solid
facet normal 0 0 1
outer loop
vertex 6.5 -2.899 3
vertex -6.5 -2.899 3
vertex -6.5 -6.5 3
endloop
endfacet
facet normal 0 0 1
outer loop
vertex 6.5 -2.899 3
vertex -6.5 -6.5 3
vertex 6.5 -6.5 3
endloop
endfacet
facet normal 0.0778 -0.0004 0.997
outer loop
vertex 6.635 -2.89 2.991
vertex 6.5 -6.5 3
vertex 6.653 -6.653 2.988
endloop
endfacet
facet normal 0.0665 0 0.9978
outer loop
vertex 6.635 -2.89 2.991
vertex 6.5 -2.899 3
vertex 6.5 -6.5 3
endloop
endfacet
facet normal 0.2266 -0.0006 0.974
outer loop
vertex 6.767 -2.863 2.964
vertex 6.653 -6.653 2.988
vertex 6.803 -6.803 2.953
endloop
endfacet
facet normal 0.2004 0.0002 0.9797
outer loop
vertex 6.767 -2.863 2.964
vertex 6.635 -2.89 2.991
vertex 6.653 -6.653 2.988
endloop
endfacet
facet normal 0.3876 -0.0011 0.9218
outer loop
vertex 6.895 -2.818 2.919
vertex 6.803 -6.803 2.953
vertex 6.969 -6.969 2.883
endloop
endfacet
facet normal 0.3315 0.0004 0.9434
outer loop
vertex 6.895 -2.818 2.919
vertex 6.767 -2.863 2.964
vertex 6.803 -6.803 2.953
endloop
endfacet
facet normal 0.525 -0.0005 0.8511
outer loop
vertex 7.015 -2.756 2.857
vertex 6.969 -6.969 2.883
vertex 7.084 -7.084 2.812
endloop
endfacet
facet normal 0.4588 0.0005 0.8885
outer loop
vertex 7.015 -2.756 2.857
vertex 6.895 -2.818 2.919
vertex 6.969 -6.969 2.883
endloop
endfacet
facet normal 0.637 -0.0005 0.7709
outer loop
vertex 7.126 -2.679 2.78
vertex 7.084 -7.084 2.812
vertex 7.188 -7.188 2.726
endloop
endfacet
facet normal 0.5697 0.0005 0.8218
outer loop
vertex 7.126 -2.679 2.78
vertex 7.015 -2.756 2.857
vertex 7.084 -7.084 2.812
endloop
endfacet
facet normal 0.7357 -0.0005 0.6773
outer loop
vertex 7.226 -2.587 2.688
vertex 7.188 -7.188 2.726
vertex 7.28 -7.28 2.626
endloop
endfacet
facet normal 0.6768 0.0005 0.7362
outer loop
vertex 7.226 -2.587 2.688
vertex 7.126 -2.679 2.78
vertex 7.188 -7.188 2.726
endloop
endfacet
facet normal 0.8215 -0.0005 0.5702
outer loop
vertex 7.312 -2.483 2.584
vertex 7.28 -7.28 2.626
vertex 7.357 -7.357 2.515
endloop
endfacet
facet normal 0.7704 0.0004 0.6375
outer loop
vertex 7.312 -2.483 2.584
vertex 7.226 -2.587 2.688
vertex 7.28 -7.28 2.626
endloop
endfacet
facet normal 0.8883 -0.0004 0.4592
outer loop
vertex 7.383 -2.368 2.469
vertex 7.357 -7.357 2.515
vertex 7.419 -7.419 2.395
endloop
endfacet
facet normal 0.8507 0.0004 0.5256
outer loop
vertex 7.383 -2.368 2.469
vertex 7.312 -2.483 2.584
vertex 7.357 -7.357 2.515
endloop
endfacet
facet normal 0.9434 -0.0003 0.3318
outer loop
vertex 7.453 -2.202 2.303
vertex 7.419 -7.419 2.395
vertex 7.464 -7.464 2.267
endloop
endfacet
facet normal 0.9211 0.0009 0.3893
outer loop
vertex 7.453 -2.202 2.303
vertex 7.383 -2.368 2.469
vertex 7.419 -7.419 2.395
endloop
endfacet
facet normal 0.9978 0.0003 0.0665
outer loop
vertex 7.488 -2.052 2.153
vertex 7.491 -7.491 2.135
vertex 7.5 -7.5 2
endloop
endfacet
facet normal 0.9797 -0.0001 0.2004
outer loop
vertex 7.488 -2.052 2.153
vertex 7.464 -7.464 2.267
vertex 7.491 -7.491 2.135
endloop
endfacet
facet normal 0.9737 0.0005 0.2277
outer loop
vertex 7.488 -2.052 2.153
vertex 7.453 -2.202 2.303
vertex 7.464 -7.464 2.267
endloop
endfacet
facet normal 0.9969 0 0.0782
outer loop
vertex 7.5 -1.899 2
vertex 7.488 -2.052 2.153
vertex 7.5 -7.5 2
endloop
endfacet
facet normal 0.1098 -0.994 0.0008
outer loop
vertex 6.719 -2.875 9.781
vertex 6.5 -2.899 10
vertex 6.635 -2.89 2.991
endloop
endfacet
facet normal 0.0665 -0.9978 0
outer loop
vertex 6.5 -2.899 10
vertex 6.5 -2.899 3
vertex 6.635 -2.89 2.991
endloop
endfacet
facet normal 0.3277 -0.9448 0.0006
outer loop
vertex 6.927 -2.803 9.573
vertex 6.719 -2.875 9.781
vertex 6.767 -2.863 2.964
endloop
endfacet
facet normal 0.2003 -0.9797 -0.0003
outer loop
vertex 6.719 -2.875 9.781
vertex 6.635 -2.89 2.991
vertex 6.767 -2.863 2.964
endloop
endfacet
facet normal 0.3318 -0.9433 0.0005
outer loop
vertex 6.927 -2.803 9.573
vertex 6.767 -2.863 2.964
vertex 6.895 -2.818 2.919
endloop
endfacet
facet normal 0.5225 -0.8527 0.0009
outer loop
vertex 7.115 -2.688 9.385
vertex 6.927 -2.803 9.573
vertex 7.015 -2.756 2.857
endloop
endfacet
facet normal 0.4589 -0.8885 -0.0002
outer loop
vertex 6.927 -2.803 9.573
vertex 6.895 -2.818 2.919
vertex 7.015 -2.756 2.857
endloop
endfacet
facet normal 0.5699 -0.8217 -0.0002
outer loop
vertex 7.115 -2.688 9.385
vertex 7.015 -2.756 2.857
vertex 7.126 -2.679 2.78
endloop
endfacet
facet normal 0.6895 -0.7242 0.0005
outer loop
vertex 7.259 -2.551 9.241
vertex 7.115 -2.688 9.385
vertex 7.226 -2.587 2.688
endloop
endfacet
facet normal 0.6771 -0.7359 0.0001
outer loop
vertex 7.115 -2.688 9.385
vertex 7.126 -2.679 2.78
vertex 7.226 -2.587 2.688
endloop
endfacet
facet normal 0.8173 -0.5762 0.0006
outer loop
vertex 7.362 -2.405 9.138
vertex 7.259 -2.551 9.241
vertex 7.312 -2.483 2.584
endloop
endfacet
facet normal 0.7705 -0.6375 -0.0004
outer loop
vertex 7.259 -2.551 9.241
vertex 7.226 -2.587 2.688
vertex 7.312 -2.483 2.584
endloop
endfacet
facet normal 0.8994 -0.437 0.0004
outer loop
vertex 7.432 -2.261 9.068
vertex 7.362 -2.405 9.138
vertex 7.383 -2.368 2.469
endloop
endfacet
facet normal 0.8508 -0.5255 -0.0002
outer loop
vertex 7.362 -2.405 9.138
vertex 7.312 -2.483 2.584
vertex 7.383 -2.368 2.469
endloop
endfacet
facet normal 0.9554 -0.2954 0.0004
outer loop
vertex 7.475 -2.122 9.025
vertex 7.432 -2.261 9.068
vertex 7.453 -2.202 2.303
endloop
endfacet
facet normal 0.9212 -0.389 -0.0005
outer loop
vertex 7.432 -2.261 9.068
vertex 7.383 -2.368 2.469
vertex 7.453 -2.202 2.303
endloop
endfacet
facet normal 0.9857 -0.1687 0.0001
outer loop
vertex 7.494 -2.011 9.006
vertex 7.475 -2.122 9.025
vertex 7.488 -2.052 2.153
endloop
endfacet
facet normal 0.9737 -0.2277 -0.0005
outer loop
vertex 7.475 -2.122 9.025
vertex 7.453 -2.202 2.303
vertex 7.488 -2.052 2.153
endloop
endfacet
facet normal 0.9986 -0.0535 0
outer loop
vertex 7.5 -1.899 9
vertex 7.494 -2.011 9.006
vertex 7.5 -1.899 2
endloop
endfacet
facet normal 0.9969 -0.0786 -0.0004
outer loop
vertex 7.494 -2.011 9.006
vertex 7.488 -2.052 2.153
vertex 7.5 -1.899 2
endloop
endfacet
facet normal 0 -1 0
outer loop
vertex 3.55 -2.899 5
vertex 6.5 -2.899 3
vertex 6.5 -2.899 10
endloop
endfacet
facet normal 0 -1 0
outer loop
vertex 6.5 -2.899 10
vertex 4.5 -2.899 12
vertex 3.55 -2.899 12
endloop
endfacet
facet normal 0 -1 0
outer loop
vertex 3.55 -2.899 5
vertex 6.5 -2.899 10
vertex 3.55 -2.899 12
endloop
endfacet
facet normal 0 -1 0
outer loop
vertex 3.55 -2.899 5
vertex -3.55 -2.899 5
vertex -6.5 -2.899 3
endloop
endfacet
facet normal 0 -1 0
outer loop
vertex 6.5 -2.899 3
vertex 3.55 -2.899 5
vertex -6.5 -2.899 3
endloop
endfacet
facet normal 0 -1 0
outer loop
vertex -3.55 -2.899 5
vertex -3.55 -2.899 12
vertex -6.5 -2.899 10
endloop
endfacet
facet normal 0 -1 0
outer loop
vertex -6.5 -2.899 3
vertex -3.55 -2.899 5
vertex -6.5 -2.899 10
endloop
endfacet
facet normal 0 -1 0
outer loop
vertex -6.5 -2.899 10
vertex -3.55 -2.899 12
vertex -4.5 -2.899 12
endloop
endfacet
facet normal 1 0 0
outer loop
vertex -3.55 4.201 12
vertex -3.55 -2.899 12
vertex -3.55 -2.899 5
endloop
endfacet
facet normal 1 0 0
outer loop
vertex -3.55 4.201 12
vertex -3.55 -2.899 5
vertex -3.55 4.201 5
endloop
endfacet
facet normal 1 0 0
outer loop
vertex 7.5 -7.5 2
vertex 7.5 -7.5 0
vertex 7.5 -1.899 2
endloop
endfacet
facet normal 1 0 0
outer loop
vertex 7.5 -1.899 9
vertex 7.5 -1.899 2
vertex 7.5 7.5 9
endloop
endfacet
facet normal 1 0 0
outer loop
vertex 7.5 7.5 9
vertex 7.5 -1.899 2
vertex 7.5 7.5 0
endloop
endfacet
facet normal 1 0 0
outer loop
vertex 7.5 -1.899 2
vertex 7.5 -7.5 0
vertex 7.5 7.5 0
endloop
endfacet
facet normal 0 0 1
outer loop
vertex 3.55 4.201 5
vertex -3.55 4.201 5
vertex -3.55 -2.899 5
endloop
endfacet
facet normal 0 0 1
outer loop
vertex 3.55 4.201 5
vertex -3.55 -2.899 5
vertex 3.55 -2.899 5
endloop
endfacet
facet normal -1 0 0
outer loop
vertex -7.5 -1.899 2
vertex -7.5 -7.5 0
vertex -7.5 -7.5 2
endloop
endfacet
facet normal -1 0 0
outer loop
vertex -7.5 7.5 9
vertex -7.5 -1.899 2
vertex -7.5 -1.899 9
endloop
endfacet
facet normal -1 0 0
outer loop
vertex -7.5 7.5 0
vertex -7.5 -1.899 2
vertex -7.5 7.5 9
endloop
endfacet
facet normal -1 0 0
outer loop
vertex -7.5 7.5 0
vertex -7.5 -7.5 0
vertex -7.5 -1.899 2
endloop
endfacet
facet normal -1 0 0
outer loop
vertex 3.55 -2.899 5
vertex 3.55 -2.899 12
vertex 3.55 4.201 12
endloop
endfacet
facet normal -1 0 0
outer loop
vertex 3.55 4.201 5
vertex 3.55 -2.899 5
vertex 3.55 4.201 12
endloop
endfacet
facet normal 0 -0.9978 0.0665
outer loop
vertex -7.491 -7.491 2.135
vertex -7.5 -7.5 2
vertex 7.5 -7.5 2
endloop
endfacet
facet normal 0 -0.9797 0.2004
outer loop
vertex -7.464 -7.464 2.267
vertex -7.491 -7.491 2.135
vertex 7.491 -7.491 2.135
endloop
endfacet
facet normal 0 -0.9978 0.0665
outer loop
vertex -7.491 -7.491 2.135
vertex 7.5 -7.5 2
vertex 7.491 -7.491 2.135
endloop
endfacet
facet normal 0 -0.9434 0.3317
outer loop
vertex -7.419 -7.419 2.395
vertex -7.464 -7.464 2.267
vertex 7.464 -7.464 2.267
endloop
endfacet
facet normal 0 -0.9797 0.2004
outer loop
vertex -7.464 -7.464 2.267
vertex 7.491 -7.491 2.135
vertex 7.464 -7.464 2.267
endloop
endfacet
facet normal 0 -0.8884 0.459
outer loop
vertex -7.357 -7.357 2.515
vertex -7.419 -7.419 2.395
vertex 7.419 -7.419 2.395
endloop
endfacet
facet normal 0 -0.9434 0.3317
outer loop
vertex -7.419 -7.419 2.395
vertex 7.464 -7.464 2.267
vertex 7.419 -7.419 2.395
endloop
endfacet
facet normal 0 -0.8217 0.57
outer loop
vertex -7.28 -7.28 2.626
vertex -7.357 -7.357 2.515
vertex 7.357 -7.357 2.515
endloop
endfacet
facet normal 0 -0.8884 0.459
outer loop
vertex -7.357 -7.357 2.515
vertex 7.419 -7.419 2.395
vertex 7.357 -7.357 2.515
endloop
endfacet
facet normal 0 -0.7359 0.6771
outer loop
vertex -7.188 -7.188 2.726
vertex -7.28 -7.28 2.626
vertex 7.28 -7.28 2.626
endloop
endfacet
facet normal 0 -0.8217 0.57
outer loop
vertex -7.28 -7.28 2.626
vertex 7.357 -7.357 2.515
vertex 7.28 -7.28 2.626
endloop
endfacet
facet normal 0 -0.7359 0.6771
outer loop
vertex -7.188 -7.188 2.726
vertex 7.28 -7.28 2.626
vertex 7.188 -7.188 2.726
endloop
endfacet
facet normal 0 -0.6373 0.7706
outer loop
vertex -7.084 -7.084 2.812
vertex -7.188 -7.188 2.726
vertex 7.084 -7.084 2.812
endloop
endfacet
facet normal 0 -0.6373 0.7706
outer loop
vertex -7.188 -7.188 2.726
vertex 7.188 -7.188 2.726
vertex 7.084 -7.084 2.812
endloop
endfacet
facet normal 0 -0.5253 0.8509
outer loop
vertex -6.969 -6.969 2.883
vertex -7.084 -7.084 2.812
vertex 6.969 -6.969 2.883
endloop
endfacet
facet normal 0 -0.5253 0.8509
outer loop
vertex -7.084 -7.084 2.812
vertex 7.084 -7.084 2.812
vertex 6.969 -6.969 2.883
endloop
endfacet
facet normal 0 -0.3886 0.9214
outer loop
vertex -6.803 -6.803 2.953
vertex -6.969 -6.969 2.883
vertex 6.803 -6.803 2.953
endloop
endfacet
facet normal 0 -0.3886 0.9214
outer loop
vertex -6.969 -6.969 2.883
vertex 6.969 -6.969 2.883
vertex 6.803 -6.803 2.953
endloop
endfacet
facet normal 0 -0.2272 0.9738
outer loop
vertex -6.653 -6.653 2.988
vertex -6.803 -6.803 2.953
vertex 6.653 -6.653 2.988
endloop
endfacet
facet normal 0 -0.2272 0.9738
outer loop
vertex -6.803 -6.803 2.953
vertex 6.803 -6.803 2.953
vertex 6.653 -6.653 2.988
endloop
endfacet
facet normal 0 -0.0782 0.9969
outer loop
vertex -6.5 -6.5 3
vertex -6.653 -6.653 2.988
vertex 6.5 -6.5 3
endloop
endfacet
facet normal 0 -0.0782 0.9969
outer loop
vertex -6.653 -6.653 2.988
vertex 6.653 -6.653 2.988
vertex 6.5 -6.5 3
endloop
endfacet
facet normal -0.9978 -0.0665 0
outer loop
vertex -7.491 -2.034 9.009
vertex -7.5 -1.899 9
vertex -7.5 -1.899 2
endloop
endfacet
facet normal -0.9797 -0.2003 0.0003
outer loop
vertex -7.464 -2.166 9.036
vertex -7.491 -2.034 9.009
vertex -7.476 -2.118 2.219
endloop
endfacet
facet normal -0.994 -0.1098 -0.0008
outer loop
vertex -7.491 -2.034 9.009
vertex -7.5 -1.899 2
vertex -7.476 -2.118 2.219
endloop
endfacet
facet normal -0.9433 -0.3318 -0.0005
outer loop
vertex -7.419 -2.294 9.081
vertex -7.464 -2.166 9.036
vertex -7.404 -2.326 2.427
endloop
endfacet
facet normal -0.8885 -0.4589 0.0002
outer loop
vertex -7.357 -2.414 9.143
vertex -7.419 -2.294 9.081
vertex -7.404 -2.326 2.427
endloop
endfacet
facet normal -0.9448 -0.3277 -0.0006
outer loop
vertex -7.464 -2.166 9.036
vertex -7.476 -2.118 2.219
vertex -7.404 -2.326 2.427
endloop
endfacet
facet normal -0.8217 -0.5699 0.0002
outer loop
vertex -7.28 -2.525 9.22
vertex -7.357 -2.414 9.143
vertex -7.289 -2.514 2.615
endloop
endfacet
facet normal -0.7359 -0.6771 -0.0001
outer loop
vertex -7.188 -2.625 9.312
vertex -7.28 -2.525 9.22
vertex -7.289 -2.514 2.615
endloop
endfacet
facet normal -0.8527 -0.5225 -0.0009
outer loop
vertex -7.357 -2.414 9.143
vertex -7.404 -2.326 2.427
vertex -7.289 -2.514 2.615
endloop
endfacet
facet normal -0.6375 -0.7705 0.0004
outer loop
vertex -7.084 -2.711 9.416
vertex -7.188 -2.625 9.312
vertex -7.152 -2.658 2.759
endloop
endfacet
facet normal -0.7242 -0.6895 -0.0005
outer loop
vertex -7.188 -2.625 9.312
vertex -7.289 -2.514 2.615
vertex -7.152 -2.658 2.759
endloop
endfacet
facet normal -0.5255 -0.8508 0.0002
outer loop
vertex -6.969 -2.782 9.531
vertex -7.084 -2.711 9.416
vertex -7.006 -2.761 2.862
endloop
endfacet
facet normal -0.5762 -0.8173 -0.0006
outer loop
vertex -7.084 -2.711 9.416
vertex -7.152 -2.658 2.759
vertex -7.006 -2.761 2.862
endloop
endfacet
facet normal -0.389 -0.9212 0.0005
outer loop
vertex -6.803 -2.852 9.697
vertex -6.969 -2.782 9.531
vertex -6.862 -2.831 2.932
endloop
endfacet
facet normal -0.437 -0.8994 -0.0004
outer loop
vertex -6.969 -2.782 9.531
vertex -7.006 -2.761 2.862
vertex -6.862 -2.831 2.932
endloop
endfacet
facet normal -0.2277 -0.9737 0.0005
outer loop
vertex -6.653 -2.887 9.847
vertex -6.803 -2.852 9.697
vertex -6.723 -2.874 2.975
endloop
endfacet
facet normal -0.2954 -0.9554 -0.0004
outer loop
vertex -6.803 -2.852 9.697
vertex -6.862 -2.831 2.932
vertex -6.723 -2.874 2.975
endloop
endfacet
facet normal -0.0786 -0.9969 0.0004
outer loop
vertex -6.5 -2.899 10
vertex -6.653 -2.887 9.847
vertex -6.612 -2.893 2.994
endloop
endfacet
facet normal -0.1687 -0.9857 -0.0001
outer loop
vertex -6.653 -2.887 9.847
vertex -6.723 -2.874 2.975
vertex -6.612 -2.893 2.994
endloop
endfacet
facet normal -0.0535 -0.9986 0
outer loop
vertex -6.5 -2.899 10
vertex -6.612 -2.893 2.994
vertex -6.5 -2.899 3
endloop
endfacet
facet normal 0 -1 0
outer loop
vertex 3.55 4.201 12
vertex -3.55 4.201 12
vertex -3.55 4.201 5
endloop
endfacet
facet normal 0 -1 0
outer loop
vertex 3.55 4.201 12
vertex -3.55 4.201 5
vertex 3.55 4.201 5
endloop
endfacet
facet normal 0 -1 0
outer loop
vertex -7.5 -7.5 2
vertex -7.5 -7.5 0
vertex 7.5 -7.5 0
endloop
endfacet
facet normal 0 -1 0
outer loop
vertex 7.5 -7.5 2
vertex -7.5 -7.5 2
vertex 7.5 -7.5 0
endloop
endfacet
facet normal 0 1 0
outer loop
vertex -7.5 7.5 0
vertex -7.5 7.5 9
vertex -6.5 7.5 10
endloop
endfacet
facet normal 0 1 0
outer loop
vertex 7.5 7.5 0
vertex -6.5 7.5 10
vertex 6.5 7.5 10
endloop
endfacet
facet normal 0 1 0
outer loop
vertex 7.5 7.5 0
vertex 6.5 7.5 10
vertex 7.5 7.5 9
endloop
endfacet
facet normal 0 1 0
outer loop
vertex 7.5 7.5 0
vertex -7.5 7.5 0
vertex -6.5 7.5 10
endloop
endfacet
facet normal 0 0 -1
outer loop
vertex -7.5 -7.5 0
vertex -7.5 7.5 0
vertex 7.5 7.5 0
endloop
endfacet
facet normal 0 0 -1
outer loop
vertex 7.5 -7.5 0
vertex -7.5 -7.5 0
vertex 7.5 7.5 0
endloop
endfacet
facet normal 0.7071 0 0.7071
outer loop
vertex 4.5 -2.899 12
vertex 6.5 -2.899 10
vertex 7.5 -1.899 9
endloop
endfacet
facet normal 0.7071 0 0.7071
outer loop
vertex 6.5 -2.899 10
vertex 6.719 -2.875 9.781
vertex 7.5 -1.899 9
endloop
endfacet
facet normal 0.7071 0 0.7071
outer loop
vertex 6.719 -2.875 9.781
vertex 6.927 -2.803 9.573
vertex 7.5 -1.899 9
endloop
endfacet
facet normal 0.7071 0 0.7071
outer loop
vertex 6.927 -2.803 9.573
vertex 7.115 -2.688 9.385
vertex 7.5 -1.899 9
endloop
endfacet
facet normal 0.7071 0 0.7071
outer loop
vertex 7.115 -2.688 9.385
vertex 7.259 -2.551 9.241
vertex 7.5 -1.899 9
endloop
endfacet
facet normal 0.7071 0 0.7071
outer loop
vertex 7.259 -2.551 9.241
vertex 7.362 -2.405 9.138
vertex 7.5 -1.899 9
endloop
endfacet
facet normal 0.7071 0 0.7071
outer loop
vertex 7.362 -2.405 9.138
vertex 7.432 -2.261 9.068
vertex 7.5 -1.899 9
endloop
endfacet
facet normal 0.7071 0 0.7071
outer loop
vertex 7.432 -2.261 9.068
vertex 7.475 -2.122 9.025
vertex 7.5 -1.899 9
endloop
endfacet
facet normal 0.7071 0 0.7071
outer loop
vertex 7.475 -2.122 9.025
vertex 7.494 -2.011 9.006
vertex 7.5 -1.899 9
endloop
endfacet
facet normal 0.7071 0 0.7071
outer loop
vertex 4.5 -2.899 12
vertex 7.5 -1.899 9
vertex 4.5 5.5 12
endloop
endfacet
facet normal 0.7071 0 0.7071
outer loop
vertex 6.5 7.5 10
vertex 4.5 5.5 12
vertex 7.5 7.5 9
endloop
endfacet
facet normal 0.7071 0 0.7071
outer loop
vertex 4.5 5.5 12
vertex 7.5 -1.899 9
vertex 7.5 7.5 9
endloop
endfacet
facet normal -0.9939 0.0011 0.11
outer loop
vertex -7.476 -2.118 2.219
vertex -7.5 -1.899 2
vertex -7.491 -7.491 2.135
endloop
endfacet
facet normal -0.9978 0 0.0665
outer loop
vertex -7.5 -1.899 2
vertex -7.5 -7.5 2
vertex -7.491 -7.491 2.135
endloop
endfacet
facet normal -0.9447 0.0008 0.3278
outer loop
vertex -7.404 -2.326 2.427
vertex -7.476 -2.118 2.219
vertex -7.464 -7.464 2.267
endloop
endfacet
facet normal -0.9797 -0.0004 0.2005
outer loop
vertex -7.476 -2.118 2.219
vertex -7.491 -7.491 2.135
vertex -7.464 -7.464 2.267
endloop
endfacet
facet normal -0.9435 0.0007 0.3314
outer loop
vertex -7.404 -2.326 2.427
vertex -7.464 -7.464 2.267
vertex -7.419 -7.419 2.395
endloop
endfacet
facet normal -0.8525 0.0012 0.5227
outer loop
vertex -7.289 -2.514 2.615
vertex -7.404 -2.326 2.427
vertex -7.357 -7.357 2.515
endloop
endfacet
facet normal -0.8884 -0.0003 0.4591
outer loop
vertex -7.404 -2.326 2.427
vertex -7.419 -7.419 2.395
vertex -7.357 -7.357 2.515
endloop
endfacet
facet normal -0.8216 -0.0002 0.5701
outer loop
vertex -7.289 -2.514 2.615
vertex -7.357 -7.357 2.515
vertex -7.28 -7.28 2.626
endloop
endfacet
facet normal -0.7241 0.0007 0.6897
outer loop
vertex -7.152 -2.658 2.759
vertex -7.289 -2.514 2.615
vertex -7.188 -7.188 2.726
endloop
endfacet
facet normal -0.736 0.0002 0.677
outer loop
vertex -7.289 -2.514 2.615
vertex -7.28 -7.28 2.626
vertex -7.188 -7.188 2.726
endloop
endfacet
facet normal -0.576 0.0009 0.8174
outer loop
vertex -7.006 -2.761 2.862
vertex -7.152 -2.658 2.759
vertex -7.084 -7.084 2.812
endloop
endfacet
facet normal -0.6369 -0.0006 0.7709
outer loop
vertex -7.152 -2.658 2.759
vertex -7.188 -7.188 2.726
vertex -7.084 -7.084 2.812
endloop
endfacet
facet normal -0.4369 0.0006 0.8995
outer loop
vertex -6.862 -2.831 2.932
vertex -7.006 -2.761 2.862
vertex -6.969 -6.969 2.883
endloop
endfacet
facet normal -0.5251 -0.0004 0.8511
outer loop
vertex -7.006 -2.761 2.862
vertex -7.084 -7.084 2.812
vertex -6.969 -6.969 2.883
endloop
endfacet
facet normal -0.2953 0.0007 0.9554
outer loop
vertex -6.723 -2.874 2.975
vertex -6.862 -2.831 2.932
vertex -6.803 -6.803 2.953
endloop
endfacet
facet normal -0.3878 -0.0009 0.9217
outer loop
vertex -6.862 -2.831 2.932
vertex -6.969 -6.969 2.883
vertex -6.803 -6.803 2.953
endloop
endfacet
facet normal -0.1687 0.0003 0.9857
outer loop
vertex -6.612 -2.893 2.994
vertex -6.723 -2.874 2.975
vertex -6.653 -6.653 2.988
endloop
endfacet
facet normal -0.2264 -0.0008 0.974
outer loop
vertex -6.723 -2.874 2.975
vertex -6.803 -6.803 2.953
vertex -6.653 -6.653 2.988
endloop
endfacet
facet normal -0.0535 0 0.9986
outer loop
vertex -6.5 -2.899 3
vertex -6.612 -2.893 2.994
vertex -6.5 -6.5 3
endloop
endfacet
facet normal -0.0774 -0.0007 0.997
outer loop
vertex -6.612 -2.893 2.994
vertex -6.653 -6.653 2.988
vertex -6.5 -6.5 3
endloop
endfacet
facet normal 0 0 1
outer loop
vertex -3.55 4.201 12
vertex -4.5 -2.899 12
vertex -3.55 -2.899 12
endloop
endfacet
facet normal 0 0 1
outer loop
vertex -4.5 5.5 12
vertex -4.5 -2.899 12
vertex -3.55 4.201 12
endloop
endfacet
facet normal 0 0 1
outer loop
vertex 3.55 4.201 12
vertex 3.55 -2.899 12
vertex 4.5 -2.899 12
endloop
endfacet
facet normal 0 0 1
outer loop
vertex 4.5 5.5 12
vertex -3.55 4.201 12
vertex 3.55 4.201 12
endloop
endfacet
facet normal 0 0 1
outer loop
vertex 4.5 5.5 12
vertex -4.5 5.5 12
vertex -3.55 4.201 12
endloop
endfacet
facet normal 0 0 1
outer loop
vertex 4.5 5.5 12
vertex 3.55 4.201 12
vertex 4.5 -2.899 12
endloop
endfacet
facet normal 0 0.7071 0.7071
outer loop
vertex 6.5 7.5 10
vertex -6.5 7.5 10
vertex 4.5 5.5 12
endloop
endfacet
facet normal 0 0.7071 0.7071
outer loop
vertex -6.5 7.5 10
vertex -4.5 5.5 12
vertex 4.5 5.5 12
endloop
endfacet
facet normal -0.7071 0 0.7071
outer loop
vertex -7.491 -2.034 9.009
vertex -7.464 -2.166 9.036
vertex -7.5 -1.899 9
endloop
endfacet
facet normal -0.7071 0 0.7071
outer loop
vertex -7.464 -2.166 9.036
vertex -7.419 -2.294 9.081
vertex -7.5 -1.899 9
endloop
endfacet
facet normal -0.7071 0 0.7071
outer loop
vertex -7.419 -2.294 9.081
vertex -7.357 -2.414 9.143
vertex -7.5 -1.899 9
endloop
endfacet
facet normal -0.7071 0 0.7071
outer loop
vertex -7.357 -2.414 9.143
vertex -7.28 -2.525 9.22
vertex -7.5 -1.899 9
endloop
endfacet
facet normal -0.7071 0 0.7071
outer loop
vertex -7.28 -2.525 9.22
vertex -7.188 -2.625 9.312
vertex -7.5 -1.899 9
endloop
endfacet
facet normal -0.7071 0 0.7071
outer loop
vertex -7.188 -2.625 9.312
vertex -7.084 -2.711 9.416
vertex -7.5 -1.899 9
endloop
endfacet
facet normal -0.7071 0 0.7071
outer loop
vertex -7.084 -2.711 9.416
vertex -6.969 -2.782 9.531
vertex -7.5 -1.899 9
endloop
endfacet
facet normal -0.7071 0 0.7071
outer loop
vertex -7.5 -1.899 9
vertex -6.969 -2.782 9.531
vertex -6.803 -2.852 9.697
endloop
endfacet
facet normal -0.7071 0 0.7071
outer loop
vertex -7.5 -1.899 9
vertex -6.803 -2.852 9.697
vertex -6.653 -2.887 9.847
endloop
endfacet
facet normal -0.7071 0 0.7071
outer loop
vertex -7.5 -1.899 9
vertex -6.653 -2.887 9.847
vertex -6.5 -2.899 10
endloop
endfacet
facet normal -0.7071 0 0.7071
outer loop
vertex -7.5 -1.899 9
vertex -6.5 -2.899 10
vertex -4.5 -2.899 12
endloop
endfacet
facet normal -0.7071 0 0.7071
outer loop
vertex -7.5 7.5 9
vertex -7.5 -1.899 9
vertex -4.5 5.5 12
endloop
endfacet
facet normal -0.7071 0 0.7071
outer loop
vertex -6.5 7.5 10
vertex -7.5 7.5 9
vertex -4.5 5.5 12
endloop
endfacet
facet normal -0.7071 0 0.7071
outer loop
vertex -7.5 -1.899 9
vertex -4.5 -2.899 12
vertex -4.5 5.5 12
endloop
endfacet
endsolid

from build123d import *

# Parameters (mm, degrees)
SKETCH_W        = 15
SKETCH_H        = 15
PAD_DEPTH       = 12
SKETCH001_W     = 7.1
SKETCH001_H     = 7.1
POCKET_DEPTH    = 7
POCKET001_DEPTH = 9
CHAMFER_SIZE    = 2
CHAMFER001_SIZE = 3
FILLET_R        = 1


with BuildPart() as part:
    # Sketch → Pad (new body)
    with BuildSketch(Plane.XY):
        Rectangle(SKETCH_W, SKETCH_H)
    extrude(amount=PAD_DEPTH)

    # Sketch001 (on Face6 of Pad) → Pocket (cut)
    with BuildSketch(Plane.XY.offset(12)):
        with Locations((0, 0.650893)):
            Rectangle(SKETCH001_W, SKETCH001_H)
    extrude(amount=-POCKET_DEPTH, mode=Mode.SUBTRACT)

    # Sketch002 (on Face5 of Pocket) → Pocket001 (cut)
    with BuildSketch(Plane.XY.offset(12)):
        Polygon((-3.55, -2.899107), (-7.5, -2.899107), (-7.5, -7.5), (7.5, -7.5), (7.5, -2.899107), (3.55, -2.899107), align=None)
    extrude(amount=-POCKET001_DEPTH, mode=Mode.SUBTRACT)

    # Chamfer
    chamfer_edges = [part.edges().sort_by_distance(p)[0] for p in [
        (0, 7.5, 12),
    ]]
    chamfer(chamfer_edges, length=CHAMFER_SIZE)

    # Chamfer001
    chamfer001_edges = [part.edges().sort_by_distance(p)[0] for p in [
        (-7.5, 1.300446, 12),
        (7.5, 1.300446, 12),
    ]]
    chamfer(chamfer001_edges, length=CHAMFER001_SIZE)

    # Fillet
    fillet_edges = [part.edges().sort_by_distance(p)[0] for p in [
        (7.5, -2.899107, 6),
        (-7.5, -2.899107, 6),
        (-7.5, -5.199554, 3),
        (0, -7.5, 3),
        (7.5, -5.199554, 3),
    ]]
    fillet(fillet_edges, radius=FILLET_R)


solid = part.part
